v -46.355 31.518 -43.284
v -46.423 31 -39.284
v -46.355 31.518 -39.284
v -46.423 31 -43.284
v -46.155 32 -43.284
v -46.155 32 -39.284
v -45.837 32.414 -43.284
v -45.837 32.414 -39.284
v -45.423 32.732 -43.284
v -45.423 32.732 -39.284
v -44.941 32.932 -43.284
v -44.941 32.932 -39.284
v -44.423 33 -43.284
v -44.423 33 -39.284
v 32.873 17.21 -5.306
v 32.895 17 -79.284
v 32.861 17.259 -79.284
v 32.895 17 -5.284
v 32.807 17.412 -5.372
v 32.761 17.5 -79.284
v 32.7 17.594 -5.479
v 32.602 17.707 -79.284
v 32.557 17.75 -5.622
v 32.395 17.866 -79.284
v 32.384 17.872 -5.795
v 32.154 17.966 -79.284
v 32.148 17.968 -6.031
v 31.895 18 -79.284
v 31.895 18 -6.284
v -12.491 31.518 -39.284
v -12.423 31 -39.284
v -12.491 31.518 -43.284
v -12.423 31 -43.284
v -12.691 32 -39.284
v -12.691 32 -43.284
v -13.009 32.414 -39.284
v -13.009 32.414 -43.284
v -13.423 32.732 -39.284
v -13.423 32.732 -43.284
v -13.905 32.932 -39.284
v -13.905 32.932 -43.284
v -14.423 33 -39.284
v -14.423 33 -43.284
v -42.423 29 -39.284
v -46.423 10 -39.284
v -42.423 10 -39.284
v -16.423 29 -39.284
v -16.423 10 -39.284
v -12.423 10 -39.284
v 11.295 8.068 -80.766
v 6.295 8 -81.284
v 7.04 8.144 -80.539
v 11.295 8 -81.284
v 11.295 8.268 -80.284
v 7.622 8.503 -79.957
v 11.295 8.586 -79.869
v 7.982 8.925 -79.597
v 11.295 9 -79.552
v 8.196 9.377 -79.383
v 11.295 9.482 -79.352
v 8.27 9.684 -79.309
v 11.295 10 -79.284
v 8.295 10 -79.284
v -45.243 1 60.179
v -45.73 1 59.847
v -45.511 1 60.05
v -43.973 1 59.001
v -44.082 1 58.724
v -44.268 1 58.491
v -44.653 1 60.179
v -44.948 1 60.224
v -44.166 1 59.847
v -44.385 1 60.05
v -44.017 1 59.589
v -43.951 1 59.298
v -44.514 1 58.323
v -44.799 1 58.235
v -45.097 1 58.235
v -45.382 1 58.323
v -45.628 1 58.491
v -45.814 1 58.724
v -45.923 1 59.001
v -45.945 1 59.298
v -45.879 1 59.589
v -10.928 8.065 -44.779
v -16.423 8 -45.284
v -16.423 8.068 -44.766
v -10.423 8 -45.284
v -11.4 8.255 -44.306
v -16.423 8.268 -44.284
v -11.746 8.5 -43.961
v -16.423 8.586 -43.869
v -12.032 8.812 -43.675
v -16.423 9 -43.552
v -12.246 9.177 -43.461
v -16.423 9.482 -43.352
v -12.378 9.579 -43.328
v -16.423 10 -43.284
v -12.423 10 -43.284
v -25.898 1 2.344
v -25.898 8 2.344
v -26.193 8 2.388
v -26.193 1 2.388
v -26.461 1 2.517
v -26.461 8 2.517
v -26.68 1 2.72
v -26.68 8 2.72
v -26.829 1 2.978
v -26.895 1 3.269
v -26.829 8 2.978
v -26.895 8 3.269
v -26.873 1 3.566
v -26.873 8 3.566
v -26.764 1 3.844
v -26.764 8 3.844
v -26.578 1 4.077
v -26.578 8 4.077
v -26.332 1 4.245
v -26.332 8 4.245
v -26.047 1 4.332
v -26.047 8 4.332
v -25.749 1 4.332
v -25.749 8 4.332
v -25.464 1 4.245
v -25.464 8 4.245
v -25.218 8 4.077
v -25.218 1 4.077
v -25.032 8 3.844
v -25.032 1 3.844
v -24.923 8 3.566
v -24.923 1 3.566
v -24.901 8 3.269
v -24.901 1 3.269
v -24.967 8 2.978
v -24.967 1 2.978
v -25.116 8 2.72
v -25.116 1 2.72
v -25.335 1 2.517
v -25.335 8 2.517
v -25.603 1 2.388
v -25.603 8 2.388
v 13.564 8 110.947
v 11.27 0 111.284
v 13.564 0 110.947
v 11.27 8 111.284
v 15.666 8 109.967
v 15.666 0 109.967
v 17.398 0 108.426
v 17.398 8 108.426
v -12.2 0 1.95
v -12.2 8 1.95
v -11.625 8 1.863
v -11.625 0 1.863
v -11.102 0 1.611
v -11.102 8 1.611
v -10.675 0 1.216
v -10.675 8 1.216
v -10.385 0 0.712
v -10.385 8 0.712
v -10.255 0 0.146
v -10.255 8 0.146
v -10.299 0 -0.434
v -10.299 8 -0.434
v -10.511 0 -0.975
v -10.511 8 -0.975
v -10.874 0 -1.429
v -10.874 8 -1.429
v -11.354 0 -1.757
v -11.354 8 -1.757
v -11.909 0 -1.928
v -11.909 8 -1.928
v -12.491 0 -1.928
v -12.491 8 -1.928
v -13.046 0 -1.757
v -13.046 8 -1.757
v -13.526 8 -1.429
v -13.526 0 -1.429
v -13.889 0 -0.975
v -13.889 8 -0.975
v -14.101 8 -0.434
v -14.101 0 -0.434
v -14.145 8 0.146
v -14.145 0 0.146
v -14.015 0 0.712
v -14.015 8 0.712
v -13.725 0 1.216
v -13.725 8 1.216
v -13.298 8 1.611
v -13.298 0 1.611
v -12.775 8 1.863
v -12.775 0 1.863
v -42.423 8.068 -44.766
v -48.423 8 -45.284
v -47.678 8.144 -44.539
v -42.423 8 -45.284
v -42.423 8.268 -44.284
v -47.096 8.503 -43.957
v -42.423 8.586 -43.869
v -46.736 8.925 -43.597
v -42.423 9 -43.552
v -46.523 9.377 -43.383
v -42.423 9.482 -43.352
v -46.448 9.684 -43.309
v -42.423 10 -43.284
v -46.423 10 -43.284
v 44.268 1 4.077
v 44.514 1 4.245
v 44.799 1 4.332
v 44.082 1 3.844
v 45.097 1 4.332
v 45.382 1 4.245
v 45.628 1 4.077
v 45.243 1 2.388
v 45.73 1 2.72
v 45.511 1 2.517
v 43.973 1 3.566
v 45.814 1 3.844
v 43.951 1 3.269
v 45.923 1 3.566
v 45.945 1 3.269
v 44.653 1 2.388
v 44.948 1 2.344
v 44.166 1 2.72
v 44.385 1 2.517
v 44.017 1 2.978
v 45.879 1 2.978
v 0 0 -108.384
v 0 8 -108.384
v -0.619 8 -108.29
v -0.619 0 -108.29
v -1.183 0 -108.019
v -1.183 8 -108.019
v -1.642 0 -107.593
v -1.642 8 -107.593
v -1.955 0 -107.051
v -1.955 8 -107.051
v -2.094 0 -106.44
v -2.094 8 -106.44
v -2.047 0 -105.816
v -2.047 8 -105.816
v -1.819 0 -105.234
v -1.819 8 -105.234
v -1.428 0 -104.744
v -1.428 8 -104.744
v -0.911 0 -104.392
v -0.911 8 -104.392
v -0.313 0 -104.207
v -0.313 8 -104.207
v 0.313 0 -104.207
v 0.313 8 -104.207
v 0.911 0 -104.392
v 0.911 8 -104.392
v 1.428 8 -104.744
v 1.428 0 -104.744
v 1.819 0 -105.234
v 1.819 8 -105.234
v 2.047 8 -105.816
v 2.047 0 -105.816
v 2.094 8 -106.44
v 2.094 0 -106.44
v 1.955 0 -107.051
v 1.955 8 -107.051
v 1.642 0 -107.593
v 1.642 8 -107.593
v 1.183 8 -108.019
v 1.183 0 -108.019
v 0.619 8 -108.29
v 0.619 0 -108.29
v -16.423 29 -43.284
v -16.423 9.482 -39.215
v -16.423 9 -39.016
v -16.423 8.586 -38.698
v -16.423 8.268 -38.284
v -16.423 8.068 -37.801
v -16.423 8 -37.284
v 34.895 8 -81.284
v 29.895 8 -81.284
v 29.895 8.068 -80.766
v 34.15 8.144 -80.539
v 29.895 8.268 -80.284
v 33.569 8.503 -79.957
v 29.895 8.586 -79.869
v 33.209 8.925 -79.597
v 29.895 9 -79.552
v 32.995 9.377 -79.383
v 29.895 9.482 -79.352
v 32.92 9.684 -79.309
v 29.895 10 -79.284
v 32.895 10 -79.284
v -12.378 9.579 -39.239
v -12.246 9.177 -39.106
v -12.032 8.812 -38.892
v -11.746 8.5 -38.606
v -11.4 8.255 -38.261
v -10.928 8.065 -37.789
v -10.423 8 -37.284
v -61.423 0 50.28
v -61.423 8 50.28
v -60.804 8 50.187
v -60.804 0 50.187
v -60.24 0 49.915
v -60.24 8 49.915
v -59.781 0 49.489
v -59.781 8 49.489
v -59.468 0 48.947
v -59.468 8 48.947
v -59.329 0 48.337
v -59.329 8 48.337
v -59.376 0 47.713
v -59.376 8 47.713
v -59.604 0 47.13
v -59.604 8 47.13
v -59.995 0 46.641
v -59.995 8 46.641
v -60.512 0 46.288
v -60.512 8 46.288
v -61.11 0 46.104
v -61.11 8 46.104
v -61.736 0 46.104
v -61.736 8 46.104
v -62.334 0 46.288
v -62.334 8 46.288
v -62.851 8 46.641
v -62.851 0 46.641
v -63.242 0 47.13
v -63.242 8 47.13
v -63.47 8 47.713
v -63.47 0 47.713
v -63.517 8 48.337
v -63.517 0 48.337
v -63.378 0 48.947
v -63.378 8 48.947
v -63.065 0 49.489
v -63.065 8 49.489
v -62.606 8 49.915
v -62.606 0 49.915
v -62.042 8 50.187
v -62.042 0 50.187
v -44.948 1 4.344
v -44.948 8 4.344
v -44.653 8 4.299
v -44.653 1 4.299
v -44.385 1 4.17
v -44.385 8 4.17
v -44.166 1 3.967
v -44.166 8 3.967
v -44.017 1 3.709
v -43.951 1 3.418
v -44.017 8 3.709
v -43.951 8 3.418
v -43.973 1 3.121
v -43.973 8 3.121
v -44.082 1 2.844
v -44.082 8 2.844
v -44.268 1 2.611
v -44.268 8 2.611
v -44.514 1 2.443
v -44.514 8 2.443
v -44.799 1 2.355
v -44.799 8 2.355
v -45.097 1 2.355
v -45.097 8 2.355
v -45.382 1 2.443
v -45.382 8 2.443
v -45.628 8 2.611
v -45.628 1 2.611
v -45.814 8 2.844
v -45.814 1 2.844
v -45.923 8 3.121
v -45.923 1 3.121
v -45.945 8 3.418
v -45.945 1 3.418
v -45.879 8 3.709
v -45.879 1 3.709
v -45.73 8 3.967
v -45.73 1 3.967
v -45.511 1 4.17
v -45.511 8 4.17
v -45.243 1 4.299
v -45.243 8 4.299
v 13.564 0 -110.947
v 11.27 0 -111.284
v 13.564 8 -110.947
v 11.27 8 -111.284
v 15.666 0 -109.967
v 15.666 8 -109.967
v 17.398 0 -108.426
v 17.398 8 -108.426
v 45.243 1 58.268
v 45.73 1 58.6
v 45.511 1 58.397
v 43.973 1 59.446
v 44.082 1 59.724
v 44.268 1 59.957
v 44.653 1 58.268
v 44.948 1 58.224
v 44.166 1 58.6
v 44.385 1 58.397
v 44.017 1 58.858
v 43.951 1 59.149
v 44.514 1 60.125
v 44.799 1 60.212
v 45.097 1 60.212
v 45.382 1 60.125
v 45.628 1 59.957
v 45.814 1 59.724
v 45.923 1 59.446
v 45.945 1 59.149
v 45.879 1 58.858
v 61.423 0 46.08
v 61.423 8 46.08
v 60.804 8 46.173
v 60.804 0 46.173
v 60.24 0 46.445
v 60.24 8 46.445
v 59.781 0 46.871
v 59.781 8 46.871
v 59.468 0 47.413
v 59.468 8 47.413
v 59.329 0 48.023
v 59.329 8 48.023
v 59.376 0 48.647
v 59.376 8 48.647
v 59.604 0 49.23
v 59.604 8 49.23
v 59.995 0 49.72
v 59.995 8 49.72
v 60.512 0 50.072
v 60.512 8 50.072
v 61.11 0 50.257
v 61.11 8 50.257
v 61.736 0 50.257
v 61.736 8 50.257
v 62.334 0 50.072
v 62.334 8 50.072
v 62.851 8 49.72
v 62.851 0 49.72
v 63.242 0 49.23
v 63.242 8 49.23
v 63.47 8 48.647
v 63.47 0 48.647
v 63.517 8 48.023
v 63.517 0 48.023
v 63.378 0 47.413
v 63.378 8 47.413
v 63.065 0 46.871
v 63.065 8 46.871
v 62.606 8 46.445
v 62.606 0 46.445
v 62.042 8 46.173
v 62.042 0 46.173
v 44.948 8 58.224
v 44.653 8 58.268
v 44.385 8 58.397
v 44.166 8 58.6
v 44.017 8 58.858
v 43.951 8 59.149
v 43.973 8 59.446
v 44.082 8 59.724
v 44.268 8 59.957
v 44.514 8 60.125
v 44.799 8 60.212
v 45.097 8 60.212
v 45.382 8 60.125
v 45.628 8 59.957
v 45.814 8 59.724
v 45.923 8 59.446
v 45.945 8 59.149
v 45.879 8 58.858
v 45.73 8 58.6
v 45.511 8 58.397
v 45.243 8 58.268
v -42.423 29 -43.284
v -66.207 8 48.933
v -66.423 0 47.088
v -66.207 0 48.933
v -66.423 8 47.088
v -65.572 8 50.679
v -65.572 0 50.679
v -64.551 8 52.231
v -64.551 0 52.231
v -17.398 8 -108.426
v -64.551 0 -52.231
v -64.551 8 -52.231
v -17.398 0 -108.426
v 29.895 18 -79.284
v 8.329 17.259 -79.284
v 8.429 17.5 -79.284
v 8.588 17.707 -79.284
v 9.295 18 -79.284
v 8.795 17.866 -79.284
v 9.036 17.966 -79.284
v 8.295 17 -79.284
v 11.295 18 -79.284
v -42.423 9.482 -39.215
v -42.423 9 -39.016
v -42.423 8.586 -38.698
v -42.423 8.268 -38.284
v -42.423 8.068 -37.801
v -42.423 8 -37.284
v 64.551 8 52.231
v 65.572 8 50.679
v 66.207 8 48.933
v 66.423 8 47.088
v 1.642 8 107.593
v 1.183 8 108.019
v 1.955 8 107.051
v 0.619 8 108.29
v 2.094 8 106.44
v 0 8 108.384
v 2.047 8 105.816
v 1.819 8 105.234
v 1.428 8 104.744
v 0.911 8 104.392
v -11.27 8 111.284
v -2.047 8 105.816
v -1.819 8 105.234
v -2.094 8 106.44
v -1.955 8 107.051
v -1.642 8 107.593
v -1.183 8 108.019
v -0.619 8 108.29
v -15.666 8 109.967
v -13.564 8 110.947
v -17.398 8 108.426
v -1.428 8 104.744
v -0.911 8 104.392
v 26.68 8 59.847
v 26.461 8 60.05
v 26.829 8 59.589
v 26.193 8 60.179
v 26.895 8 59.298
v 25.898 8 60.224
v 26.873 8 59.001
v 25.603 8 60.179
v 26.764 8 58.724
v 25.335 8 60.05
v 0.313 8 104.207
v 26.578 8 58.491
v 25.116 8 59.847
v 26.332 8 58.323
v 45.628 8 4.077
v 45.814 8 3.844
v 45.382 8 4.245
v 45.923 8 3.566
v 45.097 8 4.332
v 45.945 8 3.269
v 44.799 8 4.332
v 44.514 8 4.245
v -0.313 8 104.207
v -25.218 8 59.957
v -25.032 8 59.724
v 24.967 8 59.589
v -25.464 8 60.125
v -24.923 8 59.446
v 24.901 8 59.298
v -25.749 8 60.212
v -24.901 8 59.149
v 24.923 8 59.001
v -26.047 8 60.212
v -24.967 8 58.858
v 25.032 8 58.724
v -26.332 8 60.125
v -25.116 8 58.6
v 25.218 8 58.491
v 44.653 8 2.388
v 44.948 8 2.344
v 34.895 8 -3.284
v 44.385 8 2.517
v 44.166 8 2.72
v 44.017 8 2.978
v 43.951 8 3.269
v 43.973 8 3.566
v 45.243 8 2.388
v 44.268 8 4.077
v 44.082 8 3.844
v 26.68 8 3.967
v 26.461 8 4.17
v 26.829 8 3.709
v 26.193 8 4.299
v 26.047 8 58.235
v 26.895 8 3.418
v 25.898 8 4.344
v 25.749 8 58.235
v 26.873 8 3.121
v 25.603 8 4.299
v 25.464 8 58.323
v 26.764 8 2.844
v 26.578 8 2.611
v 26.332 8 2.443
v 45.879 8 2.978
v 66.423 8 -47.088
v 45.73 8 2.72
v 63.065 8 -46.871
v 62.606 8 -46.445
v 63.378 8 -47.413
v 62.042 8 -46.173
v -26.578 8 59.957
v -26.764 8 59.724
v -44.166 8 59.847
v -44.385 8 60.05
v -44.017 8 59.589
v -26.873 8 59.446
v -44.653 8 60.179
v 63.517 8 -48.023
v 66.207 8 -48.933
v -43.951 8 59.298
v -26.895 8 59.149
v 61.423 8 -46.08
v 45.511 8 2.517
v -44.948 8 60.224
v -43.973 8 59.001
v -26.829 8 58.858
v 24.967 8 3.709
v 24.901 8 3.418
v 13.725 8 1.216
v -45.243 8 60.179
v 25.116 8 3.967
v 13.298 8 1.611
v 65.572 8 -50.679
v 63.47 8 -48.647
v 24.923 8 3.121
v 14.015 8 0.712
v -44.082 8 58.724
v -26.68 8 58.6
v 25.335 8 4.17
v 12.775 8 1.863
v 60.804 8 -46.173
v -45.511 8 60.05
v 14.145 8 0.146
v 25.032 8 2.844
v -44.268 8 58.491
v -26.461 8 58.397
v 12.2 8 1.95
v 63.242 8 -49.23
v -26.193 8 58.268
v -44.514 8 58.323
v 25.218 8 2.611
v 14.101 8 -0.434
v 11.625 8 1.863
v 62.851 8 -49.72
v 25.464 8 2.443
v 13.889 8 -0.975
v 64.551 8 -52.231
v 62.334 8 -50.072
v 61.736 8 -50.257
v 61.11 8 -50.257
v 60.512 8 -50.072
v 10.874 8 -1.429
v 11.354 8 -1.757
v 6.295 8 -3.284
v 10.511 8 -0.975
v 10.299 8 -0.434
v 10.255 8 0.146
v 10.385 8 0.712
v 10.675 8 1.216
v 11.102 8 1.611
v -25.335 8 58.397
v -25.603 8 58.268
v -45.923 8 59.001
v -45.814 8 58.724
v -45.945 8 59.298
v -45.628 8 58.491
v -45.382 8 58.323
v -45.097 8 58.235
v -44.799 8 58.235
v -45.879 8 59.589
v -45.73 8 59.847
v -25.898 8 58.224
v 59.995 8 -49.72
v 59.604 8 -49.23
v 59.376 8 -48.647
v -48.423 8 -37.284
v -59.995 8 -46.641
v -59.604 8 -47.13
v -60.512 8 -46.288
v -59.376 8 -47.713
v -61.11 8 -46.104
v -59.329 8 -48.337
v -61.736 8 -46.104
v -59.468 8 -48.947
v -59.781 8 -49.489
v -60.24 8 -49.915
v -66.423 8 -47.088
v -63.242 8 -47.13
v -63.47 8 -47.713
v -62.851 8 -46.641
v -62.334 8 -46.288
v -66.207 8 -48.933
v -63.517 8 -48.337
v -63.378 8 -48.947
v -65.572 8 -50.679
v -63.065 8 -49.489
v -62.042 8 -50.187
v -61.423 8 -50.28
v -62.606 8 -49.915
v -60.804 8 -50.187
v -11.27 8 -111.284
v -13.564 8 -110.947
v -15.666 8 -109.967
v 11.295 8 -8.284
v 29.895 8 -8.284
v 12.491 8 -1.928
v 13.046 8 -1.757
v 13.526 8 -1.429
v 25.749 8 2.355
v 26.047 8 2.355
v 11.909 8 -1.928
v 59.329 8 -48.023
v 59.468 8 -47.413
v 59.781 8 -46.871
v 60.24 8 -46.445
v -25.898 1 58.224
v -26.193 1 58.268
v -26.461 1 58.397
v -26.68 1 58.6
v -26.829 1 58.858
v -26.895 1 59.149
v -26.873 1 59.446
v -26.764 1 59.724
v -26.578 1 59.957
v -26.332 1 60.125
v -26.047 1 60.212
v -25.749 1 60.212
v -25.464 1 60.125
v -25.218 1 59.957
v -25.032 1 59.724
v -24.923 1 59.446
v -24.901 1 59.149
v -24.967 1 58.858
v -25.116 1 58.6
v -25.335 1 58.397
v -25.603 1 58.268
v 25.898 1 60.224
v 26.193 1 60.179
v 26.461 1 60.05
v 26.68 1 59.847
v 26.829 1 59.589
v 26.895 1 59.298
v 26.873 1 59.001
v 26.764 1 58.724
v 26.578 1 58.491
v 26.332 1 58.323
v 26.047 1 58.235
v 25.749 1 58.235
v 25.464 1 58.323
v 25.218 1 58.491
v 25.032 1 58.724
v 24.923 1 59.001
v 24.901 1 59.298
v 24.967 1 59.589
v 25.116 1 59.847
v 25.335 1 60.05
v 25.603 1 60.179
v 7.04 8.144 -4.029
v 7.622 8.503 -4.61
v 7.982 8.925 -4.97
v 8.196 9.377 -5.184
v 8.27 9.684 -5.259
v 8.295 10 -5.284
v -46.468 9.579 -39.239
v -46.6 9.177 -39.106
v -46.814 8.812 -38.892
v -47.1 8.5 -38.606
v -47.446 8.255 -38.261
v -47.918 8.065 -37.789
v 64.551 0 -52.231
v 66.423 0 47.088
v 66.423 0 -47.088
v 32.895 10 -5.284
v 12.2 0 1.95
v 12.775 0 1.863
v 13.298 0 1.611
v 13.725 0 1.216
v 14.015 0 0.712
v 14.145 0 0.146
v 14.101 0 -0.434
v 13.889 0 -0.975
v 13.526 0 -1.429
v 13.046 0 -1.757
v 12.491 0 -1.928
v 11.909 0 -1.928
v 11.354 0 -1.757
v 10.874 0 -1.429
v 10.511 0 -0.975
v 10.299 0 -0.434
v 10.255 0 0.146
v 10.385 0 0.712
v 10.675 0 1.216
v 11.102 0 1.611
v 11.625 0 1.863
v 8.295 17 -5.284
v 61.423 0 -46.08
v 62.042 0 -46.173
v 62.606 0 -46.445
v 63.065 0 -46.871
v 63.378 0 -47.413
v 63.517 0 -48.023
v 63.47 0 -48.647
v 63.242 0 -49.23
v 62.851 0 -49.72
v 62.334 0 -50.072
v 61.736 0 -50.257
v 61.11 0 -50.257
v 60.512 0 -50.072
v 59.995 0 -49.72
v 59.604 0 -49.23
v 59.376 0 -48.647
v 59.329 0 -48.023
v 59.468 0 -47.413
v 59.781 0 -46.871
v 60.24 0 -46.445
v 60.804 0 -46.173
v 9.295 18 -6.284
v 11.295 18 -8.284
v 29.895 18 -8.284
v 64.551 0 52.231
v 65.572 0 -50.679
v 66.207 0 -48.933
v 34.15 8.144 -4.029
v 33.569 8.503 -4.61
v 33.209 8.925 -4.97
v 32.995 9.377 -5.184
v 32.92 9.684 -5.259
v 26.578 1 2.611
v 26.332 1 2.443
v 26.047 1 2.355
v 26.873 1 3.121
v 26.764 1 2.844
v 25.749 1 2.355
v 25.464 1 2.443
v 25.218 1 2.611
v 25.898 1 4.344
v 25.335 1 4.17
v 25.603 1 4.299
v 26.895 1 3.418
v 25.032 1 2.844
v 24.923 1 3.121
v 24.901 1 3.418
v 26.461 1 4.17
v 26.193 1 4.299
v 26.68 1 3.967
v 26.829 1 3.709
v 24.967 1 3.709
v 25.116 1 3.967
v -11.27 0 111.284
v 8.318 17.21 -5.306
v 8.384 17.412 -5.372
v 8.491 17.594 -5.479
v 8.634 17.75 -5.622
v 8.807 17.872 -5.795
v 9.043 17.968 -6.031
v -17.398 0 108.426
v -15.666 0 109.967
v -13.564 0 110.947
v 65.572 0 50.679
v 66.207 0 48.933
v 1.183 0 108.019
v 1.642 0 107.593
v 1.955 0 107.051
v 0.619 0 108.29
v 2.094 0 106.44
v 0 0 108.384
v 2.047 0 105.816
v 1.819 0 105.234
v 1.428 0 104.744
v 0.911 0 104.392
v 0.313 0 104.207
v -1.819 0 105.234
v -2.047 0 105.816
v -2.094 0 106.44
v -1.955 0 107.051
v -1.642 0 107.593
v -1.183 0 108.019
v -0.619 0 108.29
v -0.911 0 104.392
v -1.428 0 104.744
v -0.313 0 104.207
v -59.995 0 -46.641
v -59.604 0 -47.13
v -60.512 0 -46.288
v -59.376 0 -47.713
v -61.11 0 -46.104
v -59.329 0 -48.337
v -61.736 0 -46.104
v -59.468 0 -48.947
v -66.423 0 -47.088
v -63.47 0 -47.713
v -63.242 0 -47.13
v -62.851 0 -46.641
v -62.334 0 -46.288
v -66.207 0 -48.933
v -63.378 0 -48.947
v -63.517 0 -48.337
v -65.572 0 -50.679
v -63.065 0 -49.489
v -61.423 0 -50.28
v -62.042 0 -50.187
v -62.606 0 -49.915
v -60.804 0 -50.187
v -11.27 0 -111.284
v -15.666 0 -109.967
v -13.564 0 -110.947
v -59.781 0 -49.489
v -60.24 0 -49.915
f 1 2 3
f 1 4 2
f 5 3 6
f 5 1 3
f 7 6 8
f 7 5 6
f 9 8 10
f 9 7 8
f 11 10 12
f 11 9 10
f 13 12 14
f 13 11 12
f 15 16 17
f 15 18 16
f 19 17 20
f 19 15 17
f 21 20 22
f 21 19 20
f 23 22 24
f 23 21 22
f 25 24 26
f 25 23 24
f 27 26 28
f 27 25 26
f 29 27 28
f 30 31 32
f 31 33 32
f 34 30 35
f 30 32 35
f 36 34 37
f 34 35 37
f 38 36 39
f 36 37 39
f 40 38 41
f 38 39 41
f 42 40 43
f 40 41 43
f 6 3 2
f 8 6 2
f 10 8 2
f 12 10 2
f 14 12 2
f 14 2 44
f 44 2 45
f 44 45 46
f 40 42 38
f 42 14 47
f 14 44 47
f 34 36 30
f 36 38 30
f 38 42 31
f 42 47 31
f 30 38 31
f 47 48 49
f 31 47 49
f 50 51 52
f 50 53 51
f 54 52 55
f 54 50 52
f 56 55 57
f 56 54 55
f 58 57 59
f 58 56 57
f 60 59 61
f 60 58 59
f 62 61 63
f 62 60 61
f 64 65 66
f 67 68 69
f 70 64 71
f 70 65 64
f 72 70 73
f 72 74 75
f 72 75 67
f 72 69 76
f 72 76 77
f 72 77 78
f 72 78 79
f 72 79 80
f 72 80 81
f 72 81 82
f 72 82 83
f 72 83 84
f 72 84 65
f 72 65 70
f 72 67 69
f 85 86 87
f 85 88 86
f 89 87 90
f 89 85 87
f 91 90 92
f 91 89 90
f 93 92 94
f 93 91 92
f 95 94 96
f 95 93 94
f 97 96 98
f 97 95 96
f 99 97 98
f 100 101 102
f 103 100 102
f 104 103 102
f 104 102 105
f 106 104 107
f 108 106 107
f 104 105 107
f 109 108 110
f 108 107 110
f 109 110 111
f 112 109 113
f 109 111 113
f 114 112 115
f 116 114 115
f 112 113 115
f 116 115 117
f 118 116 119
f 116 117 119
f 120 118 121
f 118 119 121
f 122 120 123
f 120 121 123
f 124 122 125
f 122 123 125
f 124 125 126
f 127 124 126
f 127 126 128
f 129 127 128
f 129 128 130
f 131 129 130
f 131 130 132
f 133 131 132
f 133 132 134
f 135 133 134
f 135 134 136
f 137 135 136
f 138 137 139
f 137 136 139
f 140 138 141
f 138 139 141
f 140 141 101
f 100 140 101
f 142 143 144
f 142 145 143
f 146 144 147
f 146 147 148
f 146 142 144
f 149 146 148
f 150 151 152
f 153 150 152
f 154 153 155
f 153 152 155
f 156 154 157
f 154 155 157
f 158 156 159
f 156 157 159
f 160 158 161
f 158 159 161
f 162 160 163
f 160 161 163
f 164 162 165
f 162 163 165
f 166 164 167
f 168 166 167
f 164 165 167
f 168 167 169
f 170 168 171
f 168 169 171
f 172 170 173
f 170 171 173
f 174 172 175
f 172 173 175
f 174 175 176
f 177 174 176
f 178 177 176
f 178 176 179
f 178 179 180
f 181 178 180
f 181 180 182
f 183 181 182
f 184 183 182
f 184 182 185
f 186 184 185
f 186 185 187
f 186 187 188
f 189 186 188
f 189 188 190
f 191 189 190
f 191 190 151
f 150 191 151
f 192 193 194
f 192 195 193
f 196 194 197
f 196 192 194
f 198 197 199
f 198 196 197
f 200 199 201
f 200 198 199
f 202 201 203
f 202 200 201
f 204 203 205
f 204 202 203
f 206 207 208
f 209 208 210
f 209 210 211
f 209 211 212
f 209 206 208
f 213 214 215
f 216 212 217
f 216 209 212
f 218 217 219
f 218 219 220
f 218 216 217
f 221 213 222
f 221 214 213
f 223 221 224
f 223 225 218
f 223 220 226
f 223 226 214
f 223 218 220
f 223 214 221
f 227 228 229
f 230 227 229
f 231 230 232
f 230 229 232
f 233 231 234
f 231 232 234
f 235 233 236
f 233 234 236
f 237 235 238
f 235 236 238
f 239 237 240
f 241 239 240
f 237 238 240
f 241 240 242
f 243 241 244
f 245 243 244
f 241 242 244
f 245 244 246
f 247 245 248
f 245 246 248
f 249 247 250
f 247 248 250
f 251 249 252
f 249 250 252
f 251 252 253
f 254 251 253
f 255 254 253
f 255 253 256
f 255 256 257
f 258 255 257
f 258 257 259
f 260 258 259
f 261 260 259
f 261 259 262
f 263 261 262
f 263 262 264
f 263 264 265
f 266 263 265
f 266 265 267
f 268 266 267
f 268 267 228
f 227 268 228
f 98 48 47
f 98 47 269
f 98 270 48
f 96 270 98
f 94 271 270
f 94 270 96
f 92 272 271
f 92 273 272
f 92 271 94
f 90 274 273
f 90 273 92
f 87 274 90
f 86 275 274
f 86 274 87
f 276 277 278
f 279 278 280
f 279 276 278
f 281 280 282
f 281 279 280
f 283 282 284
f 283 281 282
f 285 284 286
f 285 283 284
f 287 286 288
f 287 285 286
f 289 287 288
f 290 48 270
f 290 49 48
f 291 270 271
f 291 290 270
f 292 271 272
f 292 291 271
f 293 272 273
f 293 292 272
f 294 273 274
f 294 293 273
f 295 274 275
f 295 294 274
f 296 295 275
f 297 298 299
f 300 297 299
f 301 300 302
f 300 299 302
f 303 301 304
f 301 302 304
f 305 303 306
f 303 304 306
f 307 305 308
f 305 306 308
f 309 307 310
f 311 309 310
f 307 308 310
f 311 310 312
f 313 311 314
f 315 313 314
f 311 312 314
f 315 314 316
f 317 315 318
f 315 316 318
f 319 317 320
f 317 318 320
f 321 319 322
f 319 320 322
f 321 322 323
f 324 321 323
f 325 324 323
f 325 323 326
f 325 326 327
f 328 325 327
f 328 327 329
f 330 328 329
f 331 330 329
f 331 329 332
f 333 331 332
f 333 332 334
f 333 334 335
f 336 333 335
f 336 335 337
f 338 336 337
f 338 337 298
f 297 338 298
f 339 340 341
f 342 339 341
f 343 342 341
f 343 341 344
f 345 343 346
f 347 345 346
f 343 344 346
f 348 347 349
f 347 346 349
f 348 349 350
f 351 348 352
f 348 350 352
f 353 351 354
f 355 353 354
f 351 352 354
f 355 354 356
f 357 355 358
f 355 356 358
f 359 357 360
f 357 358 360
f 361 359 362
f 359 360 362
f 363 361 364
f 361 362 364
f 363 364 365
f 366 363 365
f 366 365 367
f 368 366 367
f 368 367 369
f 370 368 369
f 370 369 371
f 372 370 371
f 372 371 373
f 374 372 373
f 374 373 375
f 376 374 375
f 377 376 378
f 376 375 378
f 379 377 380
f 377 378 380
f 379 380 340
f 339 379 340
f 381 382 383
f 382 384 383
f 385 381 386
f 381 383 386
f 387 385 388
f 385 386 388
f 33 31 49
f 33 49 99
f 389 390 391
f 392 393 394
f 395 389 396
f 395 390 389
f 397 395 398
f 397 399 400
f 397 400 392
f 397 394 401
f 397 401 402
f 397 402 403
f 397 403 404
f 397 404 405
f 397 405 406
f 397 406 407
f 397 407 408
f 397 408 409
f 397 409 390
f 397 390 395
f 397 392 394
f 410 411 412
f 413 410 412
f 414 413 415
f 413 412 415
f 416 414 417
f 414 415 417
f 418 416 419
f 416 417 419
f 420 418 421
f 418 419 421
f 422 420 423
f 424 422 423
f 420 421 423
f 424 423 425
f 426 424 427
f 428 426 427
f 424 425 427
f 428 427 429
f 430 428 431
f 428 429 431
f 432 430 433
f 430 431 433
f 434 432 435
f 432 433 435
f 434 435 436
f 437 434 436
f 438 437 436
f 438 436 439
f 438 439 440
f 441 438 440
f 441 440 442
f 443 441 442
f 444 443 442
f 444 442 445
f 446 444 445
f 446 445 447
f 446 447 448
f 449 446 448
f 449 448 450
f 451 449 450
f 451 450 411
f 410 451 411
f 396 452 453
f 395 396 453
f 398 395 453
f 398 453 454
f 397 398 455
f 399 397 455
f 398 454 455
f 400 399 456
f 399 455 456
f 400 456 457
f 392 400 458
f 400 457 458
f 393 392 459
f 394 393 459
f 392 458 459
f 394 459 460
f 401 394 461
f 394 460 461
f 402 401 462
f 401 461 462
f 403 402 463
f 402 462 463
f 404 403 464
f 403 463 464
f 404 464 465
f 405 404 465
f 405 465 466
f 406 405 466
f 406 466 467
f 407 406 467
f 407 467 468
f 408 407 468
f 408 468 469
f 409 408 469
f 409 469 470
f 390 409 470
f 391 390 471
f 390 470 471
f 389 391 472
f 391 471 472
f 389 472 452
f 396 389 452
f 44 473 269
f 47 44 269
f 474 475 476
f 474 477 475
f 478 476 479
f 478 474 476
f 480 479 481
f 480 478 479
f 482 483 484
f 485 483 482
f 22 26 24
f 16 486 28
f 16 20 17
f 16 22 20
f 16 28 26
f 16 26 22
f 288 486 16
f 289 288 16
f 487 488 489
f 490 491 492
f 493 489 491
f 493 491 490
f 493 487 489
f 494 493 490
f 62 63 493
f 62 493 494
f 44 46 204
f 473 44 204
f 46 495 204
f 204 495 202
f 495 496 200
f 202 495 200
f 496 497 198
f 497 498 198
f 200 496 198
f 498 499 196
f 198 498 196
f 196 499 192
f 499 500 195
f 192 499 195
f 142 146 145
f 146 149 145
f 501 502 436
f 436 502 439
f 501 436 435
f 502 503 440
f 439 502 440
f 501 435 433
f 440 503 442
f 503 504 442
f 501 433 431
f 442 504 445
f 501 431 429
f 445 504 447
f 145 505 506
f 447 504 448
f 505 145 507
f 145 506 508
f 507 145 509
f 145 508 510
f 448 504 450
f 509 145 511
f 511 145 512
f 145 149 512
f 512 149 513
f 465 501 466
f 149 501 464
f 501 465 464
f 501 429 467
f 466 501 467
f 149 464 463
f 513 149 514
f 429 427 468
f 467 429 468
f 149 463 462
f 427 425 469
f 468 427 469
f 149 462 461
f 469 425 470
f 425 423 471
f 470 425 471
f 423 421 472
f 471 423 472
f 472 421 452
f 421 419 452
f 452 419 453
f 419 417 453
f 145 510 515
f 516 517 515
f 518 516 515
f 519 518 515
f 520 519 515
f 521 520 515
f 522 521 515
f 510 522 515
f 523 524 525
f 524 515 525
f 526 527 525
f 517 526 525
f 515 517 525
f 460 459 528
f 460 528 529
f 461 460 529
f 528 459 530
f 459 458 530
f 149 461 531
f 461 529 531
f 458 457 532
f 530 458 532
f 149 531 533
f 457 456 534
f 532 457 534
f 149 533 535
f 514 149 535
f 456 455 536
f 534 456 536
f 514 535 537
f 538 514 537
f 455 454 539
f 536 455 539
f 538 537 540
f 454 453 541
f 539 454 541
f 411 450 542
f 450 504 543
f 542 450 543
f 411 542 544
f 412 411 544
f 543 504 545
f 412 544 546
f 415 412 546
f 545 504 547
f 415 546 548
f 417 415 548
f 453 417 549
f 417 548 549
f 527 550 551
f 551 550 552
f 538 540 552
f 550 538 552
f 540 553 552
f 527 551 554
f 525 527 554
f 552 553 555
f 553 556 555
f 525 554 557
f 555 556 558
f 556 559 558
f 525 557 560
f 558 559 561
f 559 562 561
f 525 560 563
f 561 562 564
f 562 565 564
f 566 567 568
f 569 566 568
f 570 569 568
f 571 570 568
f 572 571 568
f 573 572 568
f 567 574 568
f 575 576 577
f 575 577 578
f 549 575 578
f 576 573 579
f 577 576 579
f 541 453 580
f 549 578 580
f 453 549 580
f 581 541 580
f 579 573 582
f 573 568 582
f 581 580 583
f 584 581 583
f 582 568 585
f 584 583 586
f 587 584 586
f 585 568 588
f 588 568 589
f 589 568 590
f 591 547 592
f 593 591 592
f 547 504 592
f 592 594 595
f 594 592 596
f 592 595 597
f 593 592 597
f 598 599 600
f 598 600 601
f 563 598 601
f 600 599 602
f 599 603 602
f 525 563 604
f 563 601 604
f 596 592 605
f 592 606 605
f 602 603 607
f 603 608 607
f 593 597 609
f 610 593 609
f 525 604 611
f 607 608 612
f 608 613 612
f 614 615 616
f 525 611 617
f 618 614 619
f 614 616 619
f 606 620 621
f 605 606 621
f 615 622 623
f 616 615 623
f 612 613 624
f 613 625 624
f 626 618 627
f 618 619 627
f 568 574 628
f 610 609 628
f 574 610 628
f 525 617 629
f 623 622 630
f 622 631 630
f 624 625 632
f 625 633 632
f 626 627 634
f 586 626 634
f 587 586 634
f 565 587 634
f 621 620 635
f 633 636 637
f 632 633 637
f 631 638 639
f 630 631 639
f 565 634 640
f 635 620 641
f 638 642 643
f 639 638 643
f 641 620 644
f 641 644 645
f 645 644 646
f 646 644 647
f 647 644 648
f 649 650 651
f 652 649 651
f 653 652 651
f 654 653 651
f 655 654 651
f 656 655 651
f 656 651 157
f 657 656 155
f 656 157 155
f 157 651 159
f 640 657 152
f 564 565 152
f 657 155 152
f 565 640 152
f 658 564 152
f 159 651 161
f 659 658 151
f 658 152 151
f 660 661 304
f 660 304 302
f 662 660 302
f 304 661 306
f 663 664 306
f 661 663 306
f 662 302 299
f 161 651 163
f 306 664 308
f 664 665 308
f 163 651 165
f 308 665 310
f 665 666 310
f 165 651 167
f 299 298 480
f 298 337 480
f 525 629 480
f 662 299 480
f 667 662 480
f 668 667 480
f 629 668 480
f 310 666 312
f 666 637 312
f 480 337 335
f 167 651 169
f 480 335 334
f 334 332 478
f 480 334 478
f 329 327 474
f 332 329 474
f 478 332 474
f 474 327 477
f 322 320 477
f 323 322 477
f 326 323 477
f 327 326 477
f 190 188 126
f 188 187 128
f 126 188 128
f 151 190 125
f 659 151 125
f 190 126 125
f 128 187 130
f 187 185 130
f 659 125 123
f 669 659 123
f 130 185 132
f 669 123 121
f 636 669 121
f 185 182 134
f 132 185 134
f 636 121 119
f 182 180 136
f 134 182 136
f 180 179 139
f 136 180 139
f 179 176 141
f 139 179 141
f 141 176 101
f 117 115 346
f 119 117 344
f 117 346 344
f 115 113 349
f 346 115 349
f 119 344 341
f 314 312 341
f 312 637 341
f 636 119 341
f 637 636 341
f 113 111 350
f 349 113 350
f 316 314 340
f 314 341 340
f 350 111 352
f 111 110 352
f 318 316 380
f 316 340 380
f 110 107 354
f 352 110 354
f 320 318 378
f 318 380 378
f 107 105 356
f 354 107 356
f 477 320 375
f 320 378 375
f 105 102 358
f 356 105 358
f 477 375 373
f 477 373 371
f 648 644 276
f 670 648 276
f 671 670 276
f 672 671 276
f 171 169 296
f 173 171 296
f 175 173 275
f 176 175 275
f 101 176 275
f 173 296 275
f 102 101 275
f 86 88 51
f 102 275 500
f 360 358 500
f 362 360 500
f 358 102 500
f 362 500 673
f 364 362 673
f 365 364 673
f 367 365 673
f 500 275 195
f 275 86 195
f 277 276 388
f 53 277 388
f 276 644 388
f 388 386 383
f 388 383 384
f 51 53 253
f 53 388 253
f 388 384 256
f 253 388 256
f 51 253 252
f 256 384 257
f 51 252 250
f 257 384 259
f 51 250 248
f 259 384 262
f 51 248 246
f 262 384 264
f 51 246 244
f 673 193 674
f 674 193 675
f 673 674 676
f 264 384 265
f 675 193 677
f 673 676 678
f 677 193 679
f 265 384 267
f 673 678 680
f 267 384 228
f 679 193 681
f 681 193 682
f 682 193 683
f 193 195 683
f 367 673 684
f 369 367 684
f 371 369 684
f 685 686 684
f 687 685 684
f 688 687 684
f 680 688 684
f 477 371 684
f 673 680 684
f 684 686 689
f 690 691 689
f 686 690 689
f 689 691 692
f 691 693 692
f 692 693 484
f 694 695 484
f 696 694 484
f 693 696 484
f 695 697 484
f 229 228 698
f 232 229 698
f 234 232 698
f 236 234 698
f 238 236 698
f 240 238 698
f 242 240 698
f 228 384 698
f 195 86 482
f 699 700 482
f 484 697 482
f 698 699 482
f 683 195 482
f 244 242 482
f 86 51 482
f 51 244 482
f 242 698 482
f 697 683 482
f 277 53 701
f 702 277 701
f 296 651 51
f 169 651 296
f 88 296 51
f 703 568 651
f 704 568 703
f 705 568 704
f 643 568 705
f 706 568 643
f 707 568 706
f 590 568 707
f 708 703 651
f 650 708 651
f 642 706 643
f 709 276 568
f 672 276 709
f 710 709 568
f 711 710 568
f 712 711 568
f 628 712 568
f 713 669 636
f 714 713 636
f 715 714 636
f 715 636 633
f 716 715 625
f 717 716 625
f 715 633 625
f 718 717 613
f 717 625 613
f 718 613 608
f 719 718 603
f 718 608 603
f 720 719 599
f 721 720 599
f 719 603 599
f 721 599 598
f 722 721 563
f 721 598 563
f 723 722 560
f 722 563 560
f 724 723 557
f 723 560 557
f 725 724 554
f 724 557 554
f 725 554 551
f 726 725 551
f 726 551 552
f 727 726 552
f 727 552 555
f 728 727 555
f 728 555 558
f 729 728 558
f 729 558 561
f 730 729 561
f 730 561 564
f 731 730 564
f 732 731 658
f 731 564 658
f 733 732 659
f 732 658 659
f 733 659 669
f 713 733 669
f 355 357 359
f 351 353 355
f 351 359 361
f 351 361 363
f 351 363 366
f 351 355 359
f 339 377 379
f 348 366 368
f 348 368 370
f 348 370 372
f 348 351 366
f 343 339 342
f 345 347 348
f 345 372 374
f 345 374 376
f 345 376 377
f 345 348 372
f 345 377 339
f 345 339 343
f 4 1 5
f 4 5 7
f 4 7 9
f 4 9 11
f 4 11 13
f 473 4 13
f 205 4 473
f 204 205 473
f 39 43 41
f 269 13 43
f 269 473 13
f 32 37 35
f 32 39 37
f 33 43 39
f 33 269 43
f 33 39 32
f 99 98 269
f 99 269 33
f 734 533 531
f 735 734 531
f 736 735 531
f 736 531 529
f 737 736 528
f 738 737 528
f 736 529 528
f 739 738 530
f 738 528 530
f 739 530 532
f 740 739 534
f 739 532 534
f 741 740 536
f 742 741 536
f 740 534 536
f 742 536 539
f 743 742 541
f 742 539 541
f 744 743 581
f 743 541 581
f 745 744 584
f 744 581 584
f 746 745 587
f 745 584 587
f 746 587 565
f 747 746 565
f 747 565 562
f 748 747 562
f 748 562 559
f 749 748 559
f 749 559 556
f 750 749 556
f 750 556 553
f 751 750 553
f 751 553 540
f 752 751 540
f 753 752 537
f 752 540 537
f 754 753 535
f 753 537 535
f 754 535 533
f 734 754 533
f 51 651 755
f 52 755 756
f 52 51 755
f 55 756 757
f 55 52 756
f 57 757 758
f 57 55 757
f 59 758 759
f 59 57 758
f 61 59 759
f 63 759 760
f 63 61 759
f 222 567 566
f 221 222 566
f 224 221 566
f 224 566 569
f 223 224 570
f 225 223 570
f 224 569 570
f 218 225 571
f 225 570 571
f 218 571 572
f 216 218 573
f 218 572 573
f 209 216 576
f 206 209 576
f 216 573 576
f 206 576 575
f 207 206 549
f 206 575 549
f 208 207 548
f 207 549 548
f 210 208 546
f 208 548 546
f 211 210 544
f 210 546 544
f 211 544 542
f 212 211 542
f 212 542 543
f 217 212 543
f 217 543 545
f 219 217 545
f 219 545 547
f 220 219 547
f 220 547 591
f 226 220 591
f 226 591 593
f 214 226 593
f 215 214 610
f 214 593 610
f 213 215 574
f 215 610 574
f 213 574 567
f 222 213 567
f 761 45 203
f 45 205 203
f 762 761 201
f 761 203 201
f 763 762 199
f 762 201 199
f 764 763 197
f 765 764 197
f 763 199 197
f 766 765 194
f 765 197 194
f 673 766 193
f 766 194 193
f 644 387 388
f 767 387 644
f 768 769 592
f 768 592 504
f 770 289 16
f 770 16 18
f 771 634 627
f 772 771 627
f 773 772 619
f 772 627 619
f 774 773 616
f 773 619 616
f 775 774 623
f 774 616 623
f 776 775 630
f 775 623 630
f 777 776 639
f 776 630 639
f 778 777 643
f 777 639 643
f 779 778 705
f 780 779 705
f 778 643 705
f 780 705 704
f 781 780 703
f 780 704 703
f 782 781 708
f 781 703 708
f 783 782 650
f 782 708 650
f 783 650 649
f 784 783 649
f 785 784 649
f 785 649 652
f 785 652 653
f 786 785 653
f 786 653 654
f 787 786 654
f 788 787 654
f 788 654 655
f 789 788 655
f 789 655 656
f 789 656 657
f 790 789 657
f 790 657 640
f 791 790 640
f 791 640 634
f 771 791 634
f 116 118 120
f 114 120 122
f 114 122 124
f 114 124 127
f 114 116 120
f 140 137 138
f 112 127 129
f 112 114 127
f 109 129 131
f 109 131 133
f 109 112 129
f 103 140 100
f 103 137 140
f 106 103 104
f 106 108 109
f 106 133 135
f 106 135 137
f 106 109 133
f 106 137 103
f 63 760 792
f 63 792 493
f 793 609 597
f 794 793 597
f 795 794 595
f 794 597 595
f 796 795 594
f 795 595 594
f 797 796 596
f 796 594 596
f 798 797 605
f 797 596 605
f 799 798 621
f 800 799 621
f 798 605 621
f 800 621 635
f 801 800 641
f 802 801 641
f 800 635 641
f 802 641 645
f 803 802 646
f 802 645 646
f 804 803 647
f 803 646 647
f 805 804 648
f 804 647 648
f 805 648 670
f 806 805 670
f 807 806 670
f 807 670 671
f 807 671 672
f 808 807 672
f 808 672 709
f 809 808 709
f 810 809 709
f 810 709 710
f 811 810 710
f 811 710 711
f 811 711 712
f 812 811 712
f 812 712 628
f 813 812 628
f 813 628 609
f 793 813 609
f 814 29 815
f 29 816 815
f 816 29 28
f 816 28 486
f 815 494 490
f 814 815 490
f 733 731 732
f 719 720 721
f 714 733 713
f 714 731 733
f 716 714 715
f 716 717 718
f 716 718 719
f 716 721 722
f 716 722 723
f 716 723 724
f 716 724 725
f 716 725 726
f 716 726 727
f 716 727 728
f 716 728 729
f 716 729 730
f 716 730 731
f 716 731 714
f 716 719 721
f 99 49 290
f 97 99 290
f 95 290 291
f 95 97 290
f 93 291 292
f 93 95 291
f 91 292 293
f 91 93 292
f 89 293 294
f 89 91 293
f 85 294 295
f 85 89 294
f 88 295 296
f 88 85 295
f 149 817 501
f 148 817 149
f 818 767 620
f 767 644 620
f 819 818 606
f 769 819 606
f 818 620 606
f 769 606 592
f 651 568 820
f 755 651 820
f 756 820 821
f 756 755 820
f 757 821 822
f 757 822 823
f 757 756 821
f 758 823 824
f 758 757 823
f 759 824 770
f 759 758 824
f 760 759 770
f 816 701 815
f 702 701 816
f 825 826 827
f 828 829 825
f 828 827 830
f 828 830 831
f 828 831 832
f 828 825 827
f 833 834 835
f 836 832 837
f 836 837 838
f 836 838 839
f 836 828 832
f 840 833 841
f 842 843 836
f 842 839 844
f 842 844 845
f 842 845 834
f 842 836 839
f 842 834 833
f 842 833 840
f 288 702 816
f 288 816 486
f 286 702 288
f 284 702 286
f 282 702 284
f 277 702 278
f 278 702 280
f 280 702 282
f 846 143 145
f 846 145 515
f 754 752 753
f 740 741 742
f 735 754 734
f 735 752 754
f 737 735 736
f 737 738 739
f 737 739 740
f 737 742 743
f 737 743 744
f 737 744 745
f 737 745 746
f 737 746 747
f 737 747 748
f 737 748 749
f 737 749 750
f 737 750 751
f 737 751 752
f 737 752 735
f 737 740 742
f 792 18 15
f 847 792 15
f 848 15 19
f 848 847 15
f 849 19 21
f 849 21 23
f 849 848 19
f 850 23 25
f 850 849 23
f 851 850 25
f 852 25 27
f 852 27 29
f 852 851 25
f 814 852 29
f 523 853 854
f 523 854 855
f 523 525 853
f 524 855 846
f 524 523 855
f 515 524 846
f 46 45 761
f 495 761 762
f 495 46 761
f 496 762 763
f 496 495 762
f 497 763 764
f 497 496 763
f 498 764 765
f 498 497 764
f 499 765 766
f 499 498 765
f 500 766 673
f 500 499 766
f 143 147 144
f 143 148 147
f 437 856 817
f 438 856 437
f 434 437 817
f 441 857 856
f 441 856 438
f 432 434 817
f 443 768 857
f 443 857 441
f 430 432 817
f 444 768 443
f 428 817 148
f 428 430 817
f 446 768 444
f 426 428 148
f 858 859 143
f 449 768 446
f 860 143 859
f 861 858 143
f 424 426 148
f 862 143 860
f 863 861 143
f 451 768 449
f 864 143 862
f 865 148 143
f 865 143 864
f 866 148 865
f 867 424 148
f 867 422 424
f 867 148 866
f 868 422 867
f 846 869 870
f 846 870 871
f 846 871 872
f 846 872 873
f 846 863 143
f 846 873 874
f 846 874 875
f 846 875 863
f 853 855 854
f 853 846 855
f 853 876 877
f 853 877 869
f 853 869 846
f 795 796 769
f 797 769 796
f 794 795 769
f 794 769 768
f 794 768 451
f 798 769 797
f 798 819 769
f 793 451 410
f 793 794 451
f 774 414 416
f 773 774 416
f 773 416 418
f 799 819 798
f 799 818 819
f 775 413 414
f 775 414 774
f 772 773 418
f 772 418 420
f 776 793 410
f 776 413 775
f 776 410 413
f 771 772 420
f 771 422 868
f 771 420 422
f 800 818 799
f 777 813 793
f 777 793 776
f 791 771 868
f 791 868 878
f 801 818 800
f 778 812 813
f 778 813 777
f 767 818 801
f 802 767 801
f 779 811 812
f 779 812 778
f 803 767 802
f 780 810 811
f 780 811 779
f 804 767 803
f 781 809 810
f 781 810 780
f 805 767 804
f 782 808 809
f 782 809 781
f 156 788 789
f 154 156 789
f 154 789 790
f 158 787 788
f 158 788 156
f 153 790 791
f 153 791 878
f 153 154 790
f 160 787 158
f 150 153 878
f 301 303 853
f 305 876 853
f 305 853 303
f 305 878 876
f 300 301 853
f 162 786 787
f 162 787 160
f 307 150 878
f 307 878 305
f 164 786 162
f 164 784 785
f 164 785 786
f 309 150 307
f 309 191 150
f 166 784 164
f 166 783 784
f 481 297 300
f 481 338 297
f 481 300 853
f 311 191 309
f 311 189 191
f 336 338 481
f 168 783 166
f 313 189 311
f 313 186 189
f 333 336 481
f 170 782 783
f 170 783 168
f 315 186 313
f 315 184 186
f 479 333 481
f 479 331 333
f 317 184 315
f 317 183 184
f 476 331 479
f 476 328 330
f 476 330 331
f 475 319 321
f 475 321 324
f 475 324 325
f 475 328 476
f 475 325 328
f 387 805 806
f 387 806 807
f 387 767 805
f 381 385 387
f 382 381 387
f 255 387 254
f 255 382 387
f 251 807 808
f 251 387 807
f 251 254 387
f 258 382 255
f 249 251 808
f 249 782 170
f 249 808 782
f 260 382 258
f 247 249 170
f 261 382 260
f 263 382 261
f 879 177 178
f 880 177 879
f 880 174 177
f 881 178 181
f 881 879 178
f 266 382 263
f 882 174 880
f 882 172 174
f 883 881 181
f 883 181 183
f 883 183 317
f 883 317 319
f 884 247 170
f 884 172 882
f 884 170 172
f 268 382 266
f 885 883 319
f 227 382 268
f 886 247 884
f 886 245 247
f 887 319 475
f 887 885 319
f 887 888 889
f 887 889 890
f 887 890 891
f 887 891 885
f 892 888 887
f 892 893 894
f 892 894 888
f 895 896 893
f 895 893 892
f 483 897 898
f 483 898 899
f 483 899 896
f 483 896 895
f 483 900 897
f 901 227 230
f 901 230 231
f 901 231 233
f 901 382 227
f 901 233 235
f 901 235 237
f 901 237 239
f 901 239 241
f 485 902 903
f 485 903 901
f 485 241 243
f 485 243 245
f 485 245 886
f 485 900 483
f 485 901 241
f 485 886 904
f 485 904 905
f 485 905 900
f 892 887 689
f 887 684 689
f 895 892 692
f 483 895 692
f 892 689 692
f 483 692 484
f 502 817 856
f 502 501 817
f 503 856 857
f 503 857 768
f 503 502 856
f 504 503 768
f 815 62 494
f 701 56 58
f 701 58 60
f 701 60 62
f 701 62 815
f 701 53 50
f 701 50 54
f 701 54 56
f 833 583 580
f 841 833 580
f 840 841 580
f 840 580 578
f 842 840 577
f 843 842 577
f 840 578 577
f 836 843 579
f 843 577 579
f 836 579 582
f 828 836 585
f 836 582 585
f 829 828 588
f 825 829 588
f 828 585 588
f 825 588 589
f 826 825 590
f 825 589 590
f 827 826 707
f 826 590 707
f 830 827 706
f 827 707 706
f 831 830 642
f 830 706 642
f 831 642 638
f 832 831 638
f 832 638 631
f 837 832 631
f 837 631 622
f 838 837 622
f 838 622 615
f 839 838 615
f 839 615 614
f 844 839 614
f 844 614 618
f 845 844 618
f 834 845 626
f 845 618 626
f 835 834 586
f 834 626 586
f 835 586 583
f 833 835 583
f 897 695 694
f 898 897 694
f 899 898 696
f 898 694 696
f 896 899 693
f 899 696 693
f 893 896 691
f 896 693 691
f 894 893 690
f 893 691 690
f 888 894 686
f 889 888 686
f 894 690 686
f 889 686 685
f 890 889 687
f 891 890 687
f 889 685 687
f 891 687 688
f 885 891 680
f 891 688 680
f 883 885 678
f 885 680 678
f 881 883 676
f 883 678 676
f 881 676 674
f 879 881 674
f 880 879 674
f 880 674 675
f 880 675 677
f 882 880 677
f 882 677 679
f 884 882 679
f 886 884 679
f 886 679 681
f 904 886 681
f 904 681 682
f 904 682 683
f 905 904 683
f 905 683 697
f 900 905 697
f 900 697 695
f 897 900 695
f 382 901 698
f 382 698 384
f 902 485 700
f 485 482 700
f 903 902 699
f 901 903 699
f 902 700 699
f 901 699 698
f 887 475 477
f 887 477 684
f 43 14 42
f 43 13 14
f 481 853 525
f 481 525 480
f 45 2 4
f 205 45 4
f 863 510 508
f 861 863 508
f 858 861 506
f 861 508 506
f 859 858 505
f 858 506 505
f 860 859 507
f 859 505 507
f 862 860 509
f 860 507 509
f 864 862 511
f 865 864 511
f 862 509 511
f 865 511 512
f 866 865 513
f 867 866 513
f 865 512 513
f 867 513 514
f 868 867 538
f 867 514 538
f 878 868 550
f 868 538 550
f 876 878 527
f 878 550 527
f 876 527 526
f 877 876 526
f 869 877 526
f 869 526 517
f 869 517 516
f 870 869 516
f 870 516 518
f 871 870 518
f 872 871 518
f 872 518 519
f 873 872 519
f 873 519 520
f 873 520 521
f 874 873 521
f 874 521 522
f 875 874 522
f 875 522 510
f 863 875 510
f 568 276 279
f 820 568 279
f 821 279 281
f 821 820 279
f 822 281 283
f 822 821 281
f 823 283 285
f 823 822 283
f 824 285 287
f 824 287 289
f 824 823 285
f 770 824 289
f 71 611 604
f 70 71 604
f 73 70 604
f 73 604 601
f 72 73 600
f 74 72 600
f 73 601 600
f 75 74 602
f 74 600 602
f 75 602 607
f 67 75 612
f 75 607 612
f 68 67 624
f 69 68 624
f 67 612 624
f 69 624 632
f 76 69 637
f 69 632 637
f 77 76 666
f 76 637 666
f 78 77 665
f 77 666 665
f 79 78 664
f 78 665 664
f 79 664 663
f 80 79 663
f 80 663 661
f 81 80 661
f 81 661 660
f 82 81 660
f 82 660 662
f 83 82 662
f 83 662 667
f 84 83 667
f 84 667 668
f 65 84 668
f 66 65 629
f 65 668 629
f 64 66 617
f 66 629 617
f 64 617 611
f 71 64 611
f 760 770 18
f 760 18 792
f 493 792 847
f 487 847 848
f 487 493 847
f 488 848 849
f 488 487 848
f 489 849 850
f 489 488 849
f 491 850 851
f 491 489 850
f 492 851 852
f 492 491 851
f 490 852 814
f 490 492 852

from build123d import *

# Parameters (mm, degrees)
BOSS_EXTRUDE2_DEPTH = 8
SKETCH5_R           = 2.1
CUT_EXTRUDE1_DEPTH  = 130.846239099
FILLET1_R           = 8
SKETCH6_R           = 1
CUT_EXTRUDE2_DEPTH  = 7
BOSS_EXTRUDE3_DEPTH = 10
FILLET2_R           = 2
SKETCH9_W           = 4
SKETCH9_H           = 4
BOSS_EXTRUDE4_DEPTH = 21
SKETCH10_W          = 34
SKETCH10_H          = 4
BOSS_EXTRUDE5_DEPTH = 4
FILLET3_R           = 2
FILLET4_R           = 1
SKETCH11_R          = 1.95
CUT_EXTRUDE3_DEPTH  = 132.988809405


with BuildPart() as part:
    # Sketch3 → Boss-Extrude2 (new body)
    with BuildSketch(Plane(origin=(0, 0, 0), x_dir=(1, 0, 0), z_dir=(0, 1, 0))):
        Polygon((-66.423008775, -50), (-66.423008775, 50), (-15, 111.28355545), (15, 111.28355545), (66.423008775, 50), (66.423008775, -50), (15, -111.28355545), (-15, -111.28355545), align=None)
    extrude(amount=BOSS_EXTRUDE2_DEPTH)

    # Sketch5 → Cut-Extrude1 (cut, through all)
    with BuildSketch(Plane(origin=(0, 8, 0), x_dir=(1, 0, 0), z_dir=(0, 1, 0))):
        with Locations(Location((0, -106.28355545, 0), (0, 0, 270))):
            Circle(SKETCH5_R)
        with Locations(Location((-61.423008775, -48.180148829, 0), (0, 0, 270))):
            Circle(SKETCH5_R)
        with Locations(Location((0, 106.28355545, 0), (0, 0, 90))):
            Circle(SKETCH5_R)
        with Locations(Location((-61.423008775, 48.180148829, 0), (0, 0, 90))):
            Circle(SKETCH5_R)
        with Locations(Location((61.423008775, 48.180148829, 0), (0, 0, 270))):
            Circle(SKETCH5_R)
        with Locations(Location((61.423008775, -48.180148829, 0), (0, 0, 90))):
            Circle(SKETCH5_R)
    extrude(amount=-CUT_EXTRUDE1_DEPTH, mode=Mode.SUBTRACT)

    # Fillet1
    fillet1_edges = [part.edges().sort_by_distance(p)[0] for p in [
        (-66.423008775, 4, 50),
        (-66.423008775, 4, -50),
        (-15, 4, -111.28355545),
        (15, 4, -111.28355545),
        (66.423008775, 4, -50),
        (66.423008775, 4, 50),
        (15, 4, 111.28355545),
        (-15, 4, 111.28355545),
    ]]
    fillet(fillet1_edges, radius=FILLET1_R)

    # Sketch6 → Cut-Extrude2 (cut)
    with BuildSketch(Plane(origin=(0, 8, 0), x_dir=(1, 0, 0), z_dir=(0, 1, 0))):
        with Locations(Location((-44.948008775, -3.34355545, 0), (0, 0, 270))):
            Circle(SKETCH6_R)
        with Locations(Location((-44.948008775, -59.22355545, 0), (0, 0, 270))):
            Circle(SKETCH6_R)
        with Locations(Location((-25.898008775, -59.22355545, 0), (0, 0, 90))):
            Circle(SKETCH6_R)
        with Locations(Location((-25.898008775, -3.34355545, 0), (0, 0, 90))):
            Circle(SKETCH6_R)
        with Locations(Location((44.948008775, -59.22355545, 0), (0, 0, 90))):
            Circle(SKETCH6_R)
        with Locations(Location((25.898008775, -59.22355545, 0), (0, 0, 270))):
            Circle(SKETCH6_R)
        with Locations(Location((44.948008775, -3.34355545, 0), (0, 0, 90))):
            Circle(SKETCH6_R)
        with Locations(Location((25.898008775, -3.34355545, 0), (0, 0, 270))):
            Circle(SKETCH6_R)
    extrude(amount=-CUT_EXTRUDE2_DEPTH, mode=Mode.SUBTRACT)

    # Sketch8 → Boss-Extrude3 (add)
    with BuildSketch(Plane(origin=(0, 8, 0), x_dir=(1, 0, 0), z_dir=(0, 1, 0))):
        Polygon((8.295310149, 79.28355545), (11.295310149, 79.28355545), (11.295310149, 8.28355545), (29.895310149, 8.28355545), (29.895310149, 79.28355545), (32.895310149, 79.28355545), (32.895310149, 5.28355545), (8.295310149, 5.28355545), align=None)
    extrude(amount=BOSS_EXTRUDE3_DEPTH)

    # Fillet2
    fillet2_edges = [part.edges().sort_by_distance(p)[0] for p in [
        (8.295310149, 8, -42.28355545),
        (20.595310149, 8, -5.28355545),
        (32.895310149, 8, -42.28355545),
        (31.395310149, 8, -79.28355545),
        (9.795310149, 8, -79.28355545),
    ]]
    fillet(fillet2_edges, radius=FILLET2_R)

    # Sketch9 → Boss-Extrude4 (add)
    with BuildSketch(Plane(origin=(0, 8, 0), x_dir=(1, 0, 0), z_dir=(0, 1, 0))):
        with Locations((-44.423008775, 41.28355545)):
            Rectangle(SKETCH9_W, SKETCH9_H)
        with Locations((-14.423008775, 41.28355545)):
            Rectangle(SKETCH9_W, SKETCH9_H)
    extrude(amount=BOSS_EXTRUDE4_DEPTH)

    # Sketch10 → Boss-Extrude5 (add)
    with BuildSketch(Plane(origin=(0, 29, 0), x_dir=(1, 0, 0), z_dir=(0, 1, 0))):
        with Locations((-29.423008775, 41.28355545)):
            Rectangle(SKETCH10_W, SKETCH10_H)
    extrude(amount=BOSS_EXTRUDE5_DEPTH)

    # Fillet3
    fillet3_edges = [part.edges().sort_by_distance(p)[0] for p in [
        (-44.423008775, 8, -43.28355545),
        (-46.423008775, 8, -41.28355545),
        (-44.423008775, 8, -39.28355545),
        (-12.423008775, 8, -41.28355545),
        (-14.423008775, 8, -43.28355545),
        (-14.423008775, 8, -39.28355545),
        (-46.423008775, 33, -41.28355545),
        (-12.423008775, 33, -41.28355545),
    ]]
    fillet(fillet3_edges, radius=FILLET3_R)

    # Fillet4
    fillet4_edges = [part.edges().sort_by_distance(p)[0] for p in [
        (8.295310149, 18, -42.28355545),
        (20.595310149, 18, -5.28355545),
        (32.895310149, 18, -42.28355545),
    ]]
    fillet(fillet4_edges, radius=FILLET4_R)

    # Sketch11 → Cut-Extrude3 (cut, through all)
    with BuildSketch(Plane(origin=(0, 8, 0), x_dir=(1, 0, 0), z_dir=(0, 1, 0))):
        with Locations(Location((12.2, 0, 0), (0, 0, 270))):
            Circle(SKETCH11_R)
        with Locations(Location((-12.2, 0, 0), (0, 0, 270))):
            Circle(SKETCH11_R)
    extrude(amount=-CUT_EXTRUDE3_DEPTH, mode=Mode.SUBTRACT)


solid = part.part
